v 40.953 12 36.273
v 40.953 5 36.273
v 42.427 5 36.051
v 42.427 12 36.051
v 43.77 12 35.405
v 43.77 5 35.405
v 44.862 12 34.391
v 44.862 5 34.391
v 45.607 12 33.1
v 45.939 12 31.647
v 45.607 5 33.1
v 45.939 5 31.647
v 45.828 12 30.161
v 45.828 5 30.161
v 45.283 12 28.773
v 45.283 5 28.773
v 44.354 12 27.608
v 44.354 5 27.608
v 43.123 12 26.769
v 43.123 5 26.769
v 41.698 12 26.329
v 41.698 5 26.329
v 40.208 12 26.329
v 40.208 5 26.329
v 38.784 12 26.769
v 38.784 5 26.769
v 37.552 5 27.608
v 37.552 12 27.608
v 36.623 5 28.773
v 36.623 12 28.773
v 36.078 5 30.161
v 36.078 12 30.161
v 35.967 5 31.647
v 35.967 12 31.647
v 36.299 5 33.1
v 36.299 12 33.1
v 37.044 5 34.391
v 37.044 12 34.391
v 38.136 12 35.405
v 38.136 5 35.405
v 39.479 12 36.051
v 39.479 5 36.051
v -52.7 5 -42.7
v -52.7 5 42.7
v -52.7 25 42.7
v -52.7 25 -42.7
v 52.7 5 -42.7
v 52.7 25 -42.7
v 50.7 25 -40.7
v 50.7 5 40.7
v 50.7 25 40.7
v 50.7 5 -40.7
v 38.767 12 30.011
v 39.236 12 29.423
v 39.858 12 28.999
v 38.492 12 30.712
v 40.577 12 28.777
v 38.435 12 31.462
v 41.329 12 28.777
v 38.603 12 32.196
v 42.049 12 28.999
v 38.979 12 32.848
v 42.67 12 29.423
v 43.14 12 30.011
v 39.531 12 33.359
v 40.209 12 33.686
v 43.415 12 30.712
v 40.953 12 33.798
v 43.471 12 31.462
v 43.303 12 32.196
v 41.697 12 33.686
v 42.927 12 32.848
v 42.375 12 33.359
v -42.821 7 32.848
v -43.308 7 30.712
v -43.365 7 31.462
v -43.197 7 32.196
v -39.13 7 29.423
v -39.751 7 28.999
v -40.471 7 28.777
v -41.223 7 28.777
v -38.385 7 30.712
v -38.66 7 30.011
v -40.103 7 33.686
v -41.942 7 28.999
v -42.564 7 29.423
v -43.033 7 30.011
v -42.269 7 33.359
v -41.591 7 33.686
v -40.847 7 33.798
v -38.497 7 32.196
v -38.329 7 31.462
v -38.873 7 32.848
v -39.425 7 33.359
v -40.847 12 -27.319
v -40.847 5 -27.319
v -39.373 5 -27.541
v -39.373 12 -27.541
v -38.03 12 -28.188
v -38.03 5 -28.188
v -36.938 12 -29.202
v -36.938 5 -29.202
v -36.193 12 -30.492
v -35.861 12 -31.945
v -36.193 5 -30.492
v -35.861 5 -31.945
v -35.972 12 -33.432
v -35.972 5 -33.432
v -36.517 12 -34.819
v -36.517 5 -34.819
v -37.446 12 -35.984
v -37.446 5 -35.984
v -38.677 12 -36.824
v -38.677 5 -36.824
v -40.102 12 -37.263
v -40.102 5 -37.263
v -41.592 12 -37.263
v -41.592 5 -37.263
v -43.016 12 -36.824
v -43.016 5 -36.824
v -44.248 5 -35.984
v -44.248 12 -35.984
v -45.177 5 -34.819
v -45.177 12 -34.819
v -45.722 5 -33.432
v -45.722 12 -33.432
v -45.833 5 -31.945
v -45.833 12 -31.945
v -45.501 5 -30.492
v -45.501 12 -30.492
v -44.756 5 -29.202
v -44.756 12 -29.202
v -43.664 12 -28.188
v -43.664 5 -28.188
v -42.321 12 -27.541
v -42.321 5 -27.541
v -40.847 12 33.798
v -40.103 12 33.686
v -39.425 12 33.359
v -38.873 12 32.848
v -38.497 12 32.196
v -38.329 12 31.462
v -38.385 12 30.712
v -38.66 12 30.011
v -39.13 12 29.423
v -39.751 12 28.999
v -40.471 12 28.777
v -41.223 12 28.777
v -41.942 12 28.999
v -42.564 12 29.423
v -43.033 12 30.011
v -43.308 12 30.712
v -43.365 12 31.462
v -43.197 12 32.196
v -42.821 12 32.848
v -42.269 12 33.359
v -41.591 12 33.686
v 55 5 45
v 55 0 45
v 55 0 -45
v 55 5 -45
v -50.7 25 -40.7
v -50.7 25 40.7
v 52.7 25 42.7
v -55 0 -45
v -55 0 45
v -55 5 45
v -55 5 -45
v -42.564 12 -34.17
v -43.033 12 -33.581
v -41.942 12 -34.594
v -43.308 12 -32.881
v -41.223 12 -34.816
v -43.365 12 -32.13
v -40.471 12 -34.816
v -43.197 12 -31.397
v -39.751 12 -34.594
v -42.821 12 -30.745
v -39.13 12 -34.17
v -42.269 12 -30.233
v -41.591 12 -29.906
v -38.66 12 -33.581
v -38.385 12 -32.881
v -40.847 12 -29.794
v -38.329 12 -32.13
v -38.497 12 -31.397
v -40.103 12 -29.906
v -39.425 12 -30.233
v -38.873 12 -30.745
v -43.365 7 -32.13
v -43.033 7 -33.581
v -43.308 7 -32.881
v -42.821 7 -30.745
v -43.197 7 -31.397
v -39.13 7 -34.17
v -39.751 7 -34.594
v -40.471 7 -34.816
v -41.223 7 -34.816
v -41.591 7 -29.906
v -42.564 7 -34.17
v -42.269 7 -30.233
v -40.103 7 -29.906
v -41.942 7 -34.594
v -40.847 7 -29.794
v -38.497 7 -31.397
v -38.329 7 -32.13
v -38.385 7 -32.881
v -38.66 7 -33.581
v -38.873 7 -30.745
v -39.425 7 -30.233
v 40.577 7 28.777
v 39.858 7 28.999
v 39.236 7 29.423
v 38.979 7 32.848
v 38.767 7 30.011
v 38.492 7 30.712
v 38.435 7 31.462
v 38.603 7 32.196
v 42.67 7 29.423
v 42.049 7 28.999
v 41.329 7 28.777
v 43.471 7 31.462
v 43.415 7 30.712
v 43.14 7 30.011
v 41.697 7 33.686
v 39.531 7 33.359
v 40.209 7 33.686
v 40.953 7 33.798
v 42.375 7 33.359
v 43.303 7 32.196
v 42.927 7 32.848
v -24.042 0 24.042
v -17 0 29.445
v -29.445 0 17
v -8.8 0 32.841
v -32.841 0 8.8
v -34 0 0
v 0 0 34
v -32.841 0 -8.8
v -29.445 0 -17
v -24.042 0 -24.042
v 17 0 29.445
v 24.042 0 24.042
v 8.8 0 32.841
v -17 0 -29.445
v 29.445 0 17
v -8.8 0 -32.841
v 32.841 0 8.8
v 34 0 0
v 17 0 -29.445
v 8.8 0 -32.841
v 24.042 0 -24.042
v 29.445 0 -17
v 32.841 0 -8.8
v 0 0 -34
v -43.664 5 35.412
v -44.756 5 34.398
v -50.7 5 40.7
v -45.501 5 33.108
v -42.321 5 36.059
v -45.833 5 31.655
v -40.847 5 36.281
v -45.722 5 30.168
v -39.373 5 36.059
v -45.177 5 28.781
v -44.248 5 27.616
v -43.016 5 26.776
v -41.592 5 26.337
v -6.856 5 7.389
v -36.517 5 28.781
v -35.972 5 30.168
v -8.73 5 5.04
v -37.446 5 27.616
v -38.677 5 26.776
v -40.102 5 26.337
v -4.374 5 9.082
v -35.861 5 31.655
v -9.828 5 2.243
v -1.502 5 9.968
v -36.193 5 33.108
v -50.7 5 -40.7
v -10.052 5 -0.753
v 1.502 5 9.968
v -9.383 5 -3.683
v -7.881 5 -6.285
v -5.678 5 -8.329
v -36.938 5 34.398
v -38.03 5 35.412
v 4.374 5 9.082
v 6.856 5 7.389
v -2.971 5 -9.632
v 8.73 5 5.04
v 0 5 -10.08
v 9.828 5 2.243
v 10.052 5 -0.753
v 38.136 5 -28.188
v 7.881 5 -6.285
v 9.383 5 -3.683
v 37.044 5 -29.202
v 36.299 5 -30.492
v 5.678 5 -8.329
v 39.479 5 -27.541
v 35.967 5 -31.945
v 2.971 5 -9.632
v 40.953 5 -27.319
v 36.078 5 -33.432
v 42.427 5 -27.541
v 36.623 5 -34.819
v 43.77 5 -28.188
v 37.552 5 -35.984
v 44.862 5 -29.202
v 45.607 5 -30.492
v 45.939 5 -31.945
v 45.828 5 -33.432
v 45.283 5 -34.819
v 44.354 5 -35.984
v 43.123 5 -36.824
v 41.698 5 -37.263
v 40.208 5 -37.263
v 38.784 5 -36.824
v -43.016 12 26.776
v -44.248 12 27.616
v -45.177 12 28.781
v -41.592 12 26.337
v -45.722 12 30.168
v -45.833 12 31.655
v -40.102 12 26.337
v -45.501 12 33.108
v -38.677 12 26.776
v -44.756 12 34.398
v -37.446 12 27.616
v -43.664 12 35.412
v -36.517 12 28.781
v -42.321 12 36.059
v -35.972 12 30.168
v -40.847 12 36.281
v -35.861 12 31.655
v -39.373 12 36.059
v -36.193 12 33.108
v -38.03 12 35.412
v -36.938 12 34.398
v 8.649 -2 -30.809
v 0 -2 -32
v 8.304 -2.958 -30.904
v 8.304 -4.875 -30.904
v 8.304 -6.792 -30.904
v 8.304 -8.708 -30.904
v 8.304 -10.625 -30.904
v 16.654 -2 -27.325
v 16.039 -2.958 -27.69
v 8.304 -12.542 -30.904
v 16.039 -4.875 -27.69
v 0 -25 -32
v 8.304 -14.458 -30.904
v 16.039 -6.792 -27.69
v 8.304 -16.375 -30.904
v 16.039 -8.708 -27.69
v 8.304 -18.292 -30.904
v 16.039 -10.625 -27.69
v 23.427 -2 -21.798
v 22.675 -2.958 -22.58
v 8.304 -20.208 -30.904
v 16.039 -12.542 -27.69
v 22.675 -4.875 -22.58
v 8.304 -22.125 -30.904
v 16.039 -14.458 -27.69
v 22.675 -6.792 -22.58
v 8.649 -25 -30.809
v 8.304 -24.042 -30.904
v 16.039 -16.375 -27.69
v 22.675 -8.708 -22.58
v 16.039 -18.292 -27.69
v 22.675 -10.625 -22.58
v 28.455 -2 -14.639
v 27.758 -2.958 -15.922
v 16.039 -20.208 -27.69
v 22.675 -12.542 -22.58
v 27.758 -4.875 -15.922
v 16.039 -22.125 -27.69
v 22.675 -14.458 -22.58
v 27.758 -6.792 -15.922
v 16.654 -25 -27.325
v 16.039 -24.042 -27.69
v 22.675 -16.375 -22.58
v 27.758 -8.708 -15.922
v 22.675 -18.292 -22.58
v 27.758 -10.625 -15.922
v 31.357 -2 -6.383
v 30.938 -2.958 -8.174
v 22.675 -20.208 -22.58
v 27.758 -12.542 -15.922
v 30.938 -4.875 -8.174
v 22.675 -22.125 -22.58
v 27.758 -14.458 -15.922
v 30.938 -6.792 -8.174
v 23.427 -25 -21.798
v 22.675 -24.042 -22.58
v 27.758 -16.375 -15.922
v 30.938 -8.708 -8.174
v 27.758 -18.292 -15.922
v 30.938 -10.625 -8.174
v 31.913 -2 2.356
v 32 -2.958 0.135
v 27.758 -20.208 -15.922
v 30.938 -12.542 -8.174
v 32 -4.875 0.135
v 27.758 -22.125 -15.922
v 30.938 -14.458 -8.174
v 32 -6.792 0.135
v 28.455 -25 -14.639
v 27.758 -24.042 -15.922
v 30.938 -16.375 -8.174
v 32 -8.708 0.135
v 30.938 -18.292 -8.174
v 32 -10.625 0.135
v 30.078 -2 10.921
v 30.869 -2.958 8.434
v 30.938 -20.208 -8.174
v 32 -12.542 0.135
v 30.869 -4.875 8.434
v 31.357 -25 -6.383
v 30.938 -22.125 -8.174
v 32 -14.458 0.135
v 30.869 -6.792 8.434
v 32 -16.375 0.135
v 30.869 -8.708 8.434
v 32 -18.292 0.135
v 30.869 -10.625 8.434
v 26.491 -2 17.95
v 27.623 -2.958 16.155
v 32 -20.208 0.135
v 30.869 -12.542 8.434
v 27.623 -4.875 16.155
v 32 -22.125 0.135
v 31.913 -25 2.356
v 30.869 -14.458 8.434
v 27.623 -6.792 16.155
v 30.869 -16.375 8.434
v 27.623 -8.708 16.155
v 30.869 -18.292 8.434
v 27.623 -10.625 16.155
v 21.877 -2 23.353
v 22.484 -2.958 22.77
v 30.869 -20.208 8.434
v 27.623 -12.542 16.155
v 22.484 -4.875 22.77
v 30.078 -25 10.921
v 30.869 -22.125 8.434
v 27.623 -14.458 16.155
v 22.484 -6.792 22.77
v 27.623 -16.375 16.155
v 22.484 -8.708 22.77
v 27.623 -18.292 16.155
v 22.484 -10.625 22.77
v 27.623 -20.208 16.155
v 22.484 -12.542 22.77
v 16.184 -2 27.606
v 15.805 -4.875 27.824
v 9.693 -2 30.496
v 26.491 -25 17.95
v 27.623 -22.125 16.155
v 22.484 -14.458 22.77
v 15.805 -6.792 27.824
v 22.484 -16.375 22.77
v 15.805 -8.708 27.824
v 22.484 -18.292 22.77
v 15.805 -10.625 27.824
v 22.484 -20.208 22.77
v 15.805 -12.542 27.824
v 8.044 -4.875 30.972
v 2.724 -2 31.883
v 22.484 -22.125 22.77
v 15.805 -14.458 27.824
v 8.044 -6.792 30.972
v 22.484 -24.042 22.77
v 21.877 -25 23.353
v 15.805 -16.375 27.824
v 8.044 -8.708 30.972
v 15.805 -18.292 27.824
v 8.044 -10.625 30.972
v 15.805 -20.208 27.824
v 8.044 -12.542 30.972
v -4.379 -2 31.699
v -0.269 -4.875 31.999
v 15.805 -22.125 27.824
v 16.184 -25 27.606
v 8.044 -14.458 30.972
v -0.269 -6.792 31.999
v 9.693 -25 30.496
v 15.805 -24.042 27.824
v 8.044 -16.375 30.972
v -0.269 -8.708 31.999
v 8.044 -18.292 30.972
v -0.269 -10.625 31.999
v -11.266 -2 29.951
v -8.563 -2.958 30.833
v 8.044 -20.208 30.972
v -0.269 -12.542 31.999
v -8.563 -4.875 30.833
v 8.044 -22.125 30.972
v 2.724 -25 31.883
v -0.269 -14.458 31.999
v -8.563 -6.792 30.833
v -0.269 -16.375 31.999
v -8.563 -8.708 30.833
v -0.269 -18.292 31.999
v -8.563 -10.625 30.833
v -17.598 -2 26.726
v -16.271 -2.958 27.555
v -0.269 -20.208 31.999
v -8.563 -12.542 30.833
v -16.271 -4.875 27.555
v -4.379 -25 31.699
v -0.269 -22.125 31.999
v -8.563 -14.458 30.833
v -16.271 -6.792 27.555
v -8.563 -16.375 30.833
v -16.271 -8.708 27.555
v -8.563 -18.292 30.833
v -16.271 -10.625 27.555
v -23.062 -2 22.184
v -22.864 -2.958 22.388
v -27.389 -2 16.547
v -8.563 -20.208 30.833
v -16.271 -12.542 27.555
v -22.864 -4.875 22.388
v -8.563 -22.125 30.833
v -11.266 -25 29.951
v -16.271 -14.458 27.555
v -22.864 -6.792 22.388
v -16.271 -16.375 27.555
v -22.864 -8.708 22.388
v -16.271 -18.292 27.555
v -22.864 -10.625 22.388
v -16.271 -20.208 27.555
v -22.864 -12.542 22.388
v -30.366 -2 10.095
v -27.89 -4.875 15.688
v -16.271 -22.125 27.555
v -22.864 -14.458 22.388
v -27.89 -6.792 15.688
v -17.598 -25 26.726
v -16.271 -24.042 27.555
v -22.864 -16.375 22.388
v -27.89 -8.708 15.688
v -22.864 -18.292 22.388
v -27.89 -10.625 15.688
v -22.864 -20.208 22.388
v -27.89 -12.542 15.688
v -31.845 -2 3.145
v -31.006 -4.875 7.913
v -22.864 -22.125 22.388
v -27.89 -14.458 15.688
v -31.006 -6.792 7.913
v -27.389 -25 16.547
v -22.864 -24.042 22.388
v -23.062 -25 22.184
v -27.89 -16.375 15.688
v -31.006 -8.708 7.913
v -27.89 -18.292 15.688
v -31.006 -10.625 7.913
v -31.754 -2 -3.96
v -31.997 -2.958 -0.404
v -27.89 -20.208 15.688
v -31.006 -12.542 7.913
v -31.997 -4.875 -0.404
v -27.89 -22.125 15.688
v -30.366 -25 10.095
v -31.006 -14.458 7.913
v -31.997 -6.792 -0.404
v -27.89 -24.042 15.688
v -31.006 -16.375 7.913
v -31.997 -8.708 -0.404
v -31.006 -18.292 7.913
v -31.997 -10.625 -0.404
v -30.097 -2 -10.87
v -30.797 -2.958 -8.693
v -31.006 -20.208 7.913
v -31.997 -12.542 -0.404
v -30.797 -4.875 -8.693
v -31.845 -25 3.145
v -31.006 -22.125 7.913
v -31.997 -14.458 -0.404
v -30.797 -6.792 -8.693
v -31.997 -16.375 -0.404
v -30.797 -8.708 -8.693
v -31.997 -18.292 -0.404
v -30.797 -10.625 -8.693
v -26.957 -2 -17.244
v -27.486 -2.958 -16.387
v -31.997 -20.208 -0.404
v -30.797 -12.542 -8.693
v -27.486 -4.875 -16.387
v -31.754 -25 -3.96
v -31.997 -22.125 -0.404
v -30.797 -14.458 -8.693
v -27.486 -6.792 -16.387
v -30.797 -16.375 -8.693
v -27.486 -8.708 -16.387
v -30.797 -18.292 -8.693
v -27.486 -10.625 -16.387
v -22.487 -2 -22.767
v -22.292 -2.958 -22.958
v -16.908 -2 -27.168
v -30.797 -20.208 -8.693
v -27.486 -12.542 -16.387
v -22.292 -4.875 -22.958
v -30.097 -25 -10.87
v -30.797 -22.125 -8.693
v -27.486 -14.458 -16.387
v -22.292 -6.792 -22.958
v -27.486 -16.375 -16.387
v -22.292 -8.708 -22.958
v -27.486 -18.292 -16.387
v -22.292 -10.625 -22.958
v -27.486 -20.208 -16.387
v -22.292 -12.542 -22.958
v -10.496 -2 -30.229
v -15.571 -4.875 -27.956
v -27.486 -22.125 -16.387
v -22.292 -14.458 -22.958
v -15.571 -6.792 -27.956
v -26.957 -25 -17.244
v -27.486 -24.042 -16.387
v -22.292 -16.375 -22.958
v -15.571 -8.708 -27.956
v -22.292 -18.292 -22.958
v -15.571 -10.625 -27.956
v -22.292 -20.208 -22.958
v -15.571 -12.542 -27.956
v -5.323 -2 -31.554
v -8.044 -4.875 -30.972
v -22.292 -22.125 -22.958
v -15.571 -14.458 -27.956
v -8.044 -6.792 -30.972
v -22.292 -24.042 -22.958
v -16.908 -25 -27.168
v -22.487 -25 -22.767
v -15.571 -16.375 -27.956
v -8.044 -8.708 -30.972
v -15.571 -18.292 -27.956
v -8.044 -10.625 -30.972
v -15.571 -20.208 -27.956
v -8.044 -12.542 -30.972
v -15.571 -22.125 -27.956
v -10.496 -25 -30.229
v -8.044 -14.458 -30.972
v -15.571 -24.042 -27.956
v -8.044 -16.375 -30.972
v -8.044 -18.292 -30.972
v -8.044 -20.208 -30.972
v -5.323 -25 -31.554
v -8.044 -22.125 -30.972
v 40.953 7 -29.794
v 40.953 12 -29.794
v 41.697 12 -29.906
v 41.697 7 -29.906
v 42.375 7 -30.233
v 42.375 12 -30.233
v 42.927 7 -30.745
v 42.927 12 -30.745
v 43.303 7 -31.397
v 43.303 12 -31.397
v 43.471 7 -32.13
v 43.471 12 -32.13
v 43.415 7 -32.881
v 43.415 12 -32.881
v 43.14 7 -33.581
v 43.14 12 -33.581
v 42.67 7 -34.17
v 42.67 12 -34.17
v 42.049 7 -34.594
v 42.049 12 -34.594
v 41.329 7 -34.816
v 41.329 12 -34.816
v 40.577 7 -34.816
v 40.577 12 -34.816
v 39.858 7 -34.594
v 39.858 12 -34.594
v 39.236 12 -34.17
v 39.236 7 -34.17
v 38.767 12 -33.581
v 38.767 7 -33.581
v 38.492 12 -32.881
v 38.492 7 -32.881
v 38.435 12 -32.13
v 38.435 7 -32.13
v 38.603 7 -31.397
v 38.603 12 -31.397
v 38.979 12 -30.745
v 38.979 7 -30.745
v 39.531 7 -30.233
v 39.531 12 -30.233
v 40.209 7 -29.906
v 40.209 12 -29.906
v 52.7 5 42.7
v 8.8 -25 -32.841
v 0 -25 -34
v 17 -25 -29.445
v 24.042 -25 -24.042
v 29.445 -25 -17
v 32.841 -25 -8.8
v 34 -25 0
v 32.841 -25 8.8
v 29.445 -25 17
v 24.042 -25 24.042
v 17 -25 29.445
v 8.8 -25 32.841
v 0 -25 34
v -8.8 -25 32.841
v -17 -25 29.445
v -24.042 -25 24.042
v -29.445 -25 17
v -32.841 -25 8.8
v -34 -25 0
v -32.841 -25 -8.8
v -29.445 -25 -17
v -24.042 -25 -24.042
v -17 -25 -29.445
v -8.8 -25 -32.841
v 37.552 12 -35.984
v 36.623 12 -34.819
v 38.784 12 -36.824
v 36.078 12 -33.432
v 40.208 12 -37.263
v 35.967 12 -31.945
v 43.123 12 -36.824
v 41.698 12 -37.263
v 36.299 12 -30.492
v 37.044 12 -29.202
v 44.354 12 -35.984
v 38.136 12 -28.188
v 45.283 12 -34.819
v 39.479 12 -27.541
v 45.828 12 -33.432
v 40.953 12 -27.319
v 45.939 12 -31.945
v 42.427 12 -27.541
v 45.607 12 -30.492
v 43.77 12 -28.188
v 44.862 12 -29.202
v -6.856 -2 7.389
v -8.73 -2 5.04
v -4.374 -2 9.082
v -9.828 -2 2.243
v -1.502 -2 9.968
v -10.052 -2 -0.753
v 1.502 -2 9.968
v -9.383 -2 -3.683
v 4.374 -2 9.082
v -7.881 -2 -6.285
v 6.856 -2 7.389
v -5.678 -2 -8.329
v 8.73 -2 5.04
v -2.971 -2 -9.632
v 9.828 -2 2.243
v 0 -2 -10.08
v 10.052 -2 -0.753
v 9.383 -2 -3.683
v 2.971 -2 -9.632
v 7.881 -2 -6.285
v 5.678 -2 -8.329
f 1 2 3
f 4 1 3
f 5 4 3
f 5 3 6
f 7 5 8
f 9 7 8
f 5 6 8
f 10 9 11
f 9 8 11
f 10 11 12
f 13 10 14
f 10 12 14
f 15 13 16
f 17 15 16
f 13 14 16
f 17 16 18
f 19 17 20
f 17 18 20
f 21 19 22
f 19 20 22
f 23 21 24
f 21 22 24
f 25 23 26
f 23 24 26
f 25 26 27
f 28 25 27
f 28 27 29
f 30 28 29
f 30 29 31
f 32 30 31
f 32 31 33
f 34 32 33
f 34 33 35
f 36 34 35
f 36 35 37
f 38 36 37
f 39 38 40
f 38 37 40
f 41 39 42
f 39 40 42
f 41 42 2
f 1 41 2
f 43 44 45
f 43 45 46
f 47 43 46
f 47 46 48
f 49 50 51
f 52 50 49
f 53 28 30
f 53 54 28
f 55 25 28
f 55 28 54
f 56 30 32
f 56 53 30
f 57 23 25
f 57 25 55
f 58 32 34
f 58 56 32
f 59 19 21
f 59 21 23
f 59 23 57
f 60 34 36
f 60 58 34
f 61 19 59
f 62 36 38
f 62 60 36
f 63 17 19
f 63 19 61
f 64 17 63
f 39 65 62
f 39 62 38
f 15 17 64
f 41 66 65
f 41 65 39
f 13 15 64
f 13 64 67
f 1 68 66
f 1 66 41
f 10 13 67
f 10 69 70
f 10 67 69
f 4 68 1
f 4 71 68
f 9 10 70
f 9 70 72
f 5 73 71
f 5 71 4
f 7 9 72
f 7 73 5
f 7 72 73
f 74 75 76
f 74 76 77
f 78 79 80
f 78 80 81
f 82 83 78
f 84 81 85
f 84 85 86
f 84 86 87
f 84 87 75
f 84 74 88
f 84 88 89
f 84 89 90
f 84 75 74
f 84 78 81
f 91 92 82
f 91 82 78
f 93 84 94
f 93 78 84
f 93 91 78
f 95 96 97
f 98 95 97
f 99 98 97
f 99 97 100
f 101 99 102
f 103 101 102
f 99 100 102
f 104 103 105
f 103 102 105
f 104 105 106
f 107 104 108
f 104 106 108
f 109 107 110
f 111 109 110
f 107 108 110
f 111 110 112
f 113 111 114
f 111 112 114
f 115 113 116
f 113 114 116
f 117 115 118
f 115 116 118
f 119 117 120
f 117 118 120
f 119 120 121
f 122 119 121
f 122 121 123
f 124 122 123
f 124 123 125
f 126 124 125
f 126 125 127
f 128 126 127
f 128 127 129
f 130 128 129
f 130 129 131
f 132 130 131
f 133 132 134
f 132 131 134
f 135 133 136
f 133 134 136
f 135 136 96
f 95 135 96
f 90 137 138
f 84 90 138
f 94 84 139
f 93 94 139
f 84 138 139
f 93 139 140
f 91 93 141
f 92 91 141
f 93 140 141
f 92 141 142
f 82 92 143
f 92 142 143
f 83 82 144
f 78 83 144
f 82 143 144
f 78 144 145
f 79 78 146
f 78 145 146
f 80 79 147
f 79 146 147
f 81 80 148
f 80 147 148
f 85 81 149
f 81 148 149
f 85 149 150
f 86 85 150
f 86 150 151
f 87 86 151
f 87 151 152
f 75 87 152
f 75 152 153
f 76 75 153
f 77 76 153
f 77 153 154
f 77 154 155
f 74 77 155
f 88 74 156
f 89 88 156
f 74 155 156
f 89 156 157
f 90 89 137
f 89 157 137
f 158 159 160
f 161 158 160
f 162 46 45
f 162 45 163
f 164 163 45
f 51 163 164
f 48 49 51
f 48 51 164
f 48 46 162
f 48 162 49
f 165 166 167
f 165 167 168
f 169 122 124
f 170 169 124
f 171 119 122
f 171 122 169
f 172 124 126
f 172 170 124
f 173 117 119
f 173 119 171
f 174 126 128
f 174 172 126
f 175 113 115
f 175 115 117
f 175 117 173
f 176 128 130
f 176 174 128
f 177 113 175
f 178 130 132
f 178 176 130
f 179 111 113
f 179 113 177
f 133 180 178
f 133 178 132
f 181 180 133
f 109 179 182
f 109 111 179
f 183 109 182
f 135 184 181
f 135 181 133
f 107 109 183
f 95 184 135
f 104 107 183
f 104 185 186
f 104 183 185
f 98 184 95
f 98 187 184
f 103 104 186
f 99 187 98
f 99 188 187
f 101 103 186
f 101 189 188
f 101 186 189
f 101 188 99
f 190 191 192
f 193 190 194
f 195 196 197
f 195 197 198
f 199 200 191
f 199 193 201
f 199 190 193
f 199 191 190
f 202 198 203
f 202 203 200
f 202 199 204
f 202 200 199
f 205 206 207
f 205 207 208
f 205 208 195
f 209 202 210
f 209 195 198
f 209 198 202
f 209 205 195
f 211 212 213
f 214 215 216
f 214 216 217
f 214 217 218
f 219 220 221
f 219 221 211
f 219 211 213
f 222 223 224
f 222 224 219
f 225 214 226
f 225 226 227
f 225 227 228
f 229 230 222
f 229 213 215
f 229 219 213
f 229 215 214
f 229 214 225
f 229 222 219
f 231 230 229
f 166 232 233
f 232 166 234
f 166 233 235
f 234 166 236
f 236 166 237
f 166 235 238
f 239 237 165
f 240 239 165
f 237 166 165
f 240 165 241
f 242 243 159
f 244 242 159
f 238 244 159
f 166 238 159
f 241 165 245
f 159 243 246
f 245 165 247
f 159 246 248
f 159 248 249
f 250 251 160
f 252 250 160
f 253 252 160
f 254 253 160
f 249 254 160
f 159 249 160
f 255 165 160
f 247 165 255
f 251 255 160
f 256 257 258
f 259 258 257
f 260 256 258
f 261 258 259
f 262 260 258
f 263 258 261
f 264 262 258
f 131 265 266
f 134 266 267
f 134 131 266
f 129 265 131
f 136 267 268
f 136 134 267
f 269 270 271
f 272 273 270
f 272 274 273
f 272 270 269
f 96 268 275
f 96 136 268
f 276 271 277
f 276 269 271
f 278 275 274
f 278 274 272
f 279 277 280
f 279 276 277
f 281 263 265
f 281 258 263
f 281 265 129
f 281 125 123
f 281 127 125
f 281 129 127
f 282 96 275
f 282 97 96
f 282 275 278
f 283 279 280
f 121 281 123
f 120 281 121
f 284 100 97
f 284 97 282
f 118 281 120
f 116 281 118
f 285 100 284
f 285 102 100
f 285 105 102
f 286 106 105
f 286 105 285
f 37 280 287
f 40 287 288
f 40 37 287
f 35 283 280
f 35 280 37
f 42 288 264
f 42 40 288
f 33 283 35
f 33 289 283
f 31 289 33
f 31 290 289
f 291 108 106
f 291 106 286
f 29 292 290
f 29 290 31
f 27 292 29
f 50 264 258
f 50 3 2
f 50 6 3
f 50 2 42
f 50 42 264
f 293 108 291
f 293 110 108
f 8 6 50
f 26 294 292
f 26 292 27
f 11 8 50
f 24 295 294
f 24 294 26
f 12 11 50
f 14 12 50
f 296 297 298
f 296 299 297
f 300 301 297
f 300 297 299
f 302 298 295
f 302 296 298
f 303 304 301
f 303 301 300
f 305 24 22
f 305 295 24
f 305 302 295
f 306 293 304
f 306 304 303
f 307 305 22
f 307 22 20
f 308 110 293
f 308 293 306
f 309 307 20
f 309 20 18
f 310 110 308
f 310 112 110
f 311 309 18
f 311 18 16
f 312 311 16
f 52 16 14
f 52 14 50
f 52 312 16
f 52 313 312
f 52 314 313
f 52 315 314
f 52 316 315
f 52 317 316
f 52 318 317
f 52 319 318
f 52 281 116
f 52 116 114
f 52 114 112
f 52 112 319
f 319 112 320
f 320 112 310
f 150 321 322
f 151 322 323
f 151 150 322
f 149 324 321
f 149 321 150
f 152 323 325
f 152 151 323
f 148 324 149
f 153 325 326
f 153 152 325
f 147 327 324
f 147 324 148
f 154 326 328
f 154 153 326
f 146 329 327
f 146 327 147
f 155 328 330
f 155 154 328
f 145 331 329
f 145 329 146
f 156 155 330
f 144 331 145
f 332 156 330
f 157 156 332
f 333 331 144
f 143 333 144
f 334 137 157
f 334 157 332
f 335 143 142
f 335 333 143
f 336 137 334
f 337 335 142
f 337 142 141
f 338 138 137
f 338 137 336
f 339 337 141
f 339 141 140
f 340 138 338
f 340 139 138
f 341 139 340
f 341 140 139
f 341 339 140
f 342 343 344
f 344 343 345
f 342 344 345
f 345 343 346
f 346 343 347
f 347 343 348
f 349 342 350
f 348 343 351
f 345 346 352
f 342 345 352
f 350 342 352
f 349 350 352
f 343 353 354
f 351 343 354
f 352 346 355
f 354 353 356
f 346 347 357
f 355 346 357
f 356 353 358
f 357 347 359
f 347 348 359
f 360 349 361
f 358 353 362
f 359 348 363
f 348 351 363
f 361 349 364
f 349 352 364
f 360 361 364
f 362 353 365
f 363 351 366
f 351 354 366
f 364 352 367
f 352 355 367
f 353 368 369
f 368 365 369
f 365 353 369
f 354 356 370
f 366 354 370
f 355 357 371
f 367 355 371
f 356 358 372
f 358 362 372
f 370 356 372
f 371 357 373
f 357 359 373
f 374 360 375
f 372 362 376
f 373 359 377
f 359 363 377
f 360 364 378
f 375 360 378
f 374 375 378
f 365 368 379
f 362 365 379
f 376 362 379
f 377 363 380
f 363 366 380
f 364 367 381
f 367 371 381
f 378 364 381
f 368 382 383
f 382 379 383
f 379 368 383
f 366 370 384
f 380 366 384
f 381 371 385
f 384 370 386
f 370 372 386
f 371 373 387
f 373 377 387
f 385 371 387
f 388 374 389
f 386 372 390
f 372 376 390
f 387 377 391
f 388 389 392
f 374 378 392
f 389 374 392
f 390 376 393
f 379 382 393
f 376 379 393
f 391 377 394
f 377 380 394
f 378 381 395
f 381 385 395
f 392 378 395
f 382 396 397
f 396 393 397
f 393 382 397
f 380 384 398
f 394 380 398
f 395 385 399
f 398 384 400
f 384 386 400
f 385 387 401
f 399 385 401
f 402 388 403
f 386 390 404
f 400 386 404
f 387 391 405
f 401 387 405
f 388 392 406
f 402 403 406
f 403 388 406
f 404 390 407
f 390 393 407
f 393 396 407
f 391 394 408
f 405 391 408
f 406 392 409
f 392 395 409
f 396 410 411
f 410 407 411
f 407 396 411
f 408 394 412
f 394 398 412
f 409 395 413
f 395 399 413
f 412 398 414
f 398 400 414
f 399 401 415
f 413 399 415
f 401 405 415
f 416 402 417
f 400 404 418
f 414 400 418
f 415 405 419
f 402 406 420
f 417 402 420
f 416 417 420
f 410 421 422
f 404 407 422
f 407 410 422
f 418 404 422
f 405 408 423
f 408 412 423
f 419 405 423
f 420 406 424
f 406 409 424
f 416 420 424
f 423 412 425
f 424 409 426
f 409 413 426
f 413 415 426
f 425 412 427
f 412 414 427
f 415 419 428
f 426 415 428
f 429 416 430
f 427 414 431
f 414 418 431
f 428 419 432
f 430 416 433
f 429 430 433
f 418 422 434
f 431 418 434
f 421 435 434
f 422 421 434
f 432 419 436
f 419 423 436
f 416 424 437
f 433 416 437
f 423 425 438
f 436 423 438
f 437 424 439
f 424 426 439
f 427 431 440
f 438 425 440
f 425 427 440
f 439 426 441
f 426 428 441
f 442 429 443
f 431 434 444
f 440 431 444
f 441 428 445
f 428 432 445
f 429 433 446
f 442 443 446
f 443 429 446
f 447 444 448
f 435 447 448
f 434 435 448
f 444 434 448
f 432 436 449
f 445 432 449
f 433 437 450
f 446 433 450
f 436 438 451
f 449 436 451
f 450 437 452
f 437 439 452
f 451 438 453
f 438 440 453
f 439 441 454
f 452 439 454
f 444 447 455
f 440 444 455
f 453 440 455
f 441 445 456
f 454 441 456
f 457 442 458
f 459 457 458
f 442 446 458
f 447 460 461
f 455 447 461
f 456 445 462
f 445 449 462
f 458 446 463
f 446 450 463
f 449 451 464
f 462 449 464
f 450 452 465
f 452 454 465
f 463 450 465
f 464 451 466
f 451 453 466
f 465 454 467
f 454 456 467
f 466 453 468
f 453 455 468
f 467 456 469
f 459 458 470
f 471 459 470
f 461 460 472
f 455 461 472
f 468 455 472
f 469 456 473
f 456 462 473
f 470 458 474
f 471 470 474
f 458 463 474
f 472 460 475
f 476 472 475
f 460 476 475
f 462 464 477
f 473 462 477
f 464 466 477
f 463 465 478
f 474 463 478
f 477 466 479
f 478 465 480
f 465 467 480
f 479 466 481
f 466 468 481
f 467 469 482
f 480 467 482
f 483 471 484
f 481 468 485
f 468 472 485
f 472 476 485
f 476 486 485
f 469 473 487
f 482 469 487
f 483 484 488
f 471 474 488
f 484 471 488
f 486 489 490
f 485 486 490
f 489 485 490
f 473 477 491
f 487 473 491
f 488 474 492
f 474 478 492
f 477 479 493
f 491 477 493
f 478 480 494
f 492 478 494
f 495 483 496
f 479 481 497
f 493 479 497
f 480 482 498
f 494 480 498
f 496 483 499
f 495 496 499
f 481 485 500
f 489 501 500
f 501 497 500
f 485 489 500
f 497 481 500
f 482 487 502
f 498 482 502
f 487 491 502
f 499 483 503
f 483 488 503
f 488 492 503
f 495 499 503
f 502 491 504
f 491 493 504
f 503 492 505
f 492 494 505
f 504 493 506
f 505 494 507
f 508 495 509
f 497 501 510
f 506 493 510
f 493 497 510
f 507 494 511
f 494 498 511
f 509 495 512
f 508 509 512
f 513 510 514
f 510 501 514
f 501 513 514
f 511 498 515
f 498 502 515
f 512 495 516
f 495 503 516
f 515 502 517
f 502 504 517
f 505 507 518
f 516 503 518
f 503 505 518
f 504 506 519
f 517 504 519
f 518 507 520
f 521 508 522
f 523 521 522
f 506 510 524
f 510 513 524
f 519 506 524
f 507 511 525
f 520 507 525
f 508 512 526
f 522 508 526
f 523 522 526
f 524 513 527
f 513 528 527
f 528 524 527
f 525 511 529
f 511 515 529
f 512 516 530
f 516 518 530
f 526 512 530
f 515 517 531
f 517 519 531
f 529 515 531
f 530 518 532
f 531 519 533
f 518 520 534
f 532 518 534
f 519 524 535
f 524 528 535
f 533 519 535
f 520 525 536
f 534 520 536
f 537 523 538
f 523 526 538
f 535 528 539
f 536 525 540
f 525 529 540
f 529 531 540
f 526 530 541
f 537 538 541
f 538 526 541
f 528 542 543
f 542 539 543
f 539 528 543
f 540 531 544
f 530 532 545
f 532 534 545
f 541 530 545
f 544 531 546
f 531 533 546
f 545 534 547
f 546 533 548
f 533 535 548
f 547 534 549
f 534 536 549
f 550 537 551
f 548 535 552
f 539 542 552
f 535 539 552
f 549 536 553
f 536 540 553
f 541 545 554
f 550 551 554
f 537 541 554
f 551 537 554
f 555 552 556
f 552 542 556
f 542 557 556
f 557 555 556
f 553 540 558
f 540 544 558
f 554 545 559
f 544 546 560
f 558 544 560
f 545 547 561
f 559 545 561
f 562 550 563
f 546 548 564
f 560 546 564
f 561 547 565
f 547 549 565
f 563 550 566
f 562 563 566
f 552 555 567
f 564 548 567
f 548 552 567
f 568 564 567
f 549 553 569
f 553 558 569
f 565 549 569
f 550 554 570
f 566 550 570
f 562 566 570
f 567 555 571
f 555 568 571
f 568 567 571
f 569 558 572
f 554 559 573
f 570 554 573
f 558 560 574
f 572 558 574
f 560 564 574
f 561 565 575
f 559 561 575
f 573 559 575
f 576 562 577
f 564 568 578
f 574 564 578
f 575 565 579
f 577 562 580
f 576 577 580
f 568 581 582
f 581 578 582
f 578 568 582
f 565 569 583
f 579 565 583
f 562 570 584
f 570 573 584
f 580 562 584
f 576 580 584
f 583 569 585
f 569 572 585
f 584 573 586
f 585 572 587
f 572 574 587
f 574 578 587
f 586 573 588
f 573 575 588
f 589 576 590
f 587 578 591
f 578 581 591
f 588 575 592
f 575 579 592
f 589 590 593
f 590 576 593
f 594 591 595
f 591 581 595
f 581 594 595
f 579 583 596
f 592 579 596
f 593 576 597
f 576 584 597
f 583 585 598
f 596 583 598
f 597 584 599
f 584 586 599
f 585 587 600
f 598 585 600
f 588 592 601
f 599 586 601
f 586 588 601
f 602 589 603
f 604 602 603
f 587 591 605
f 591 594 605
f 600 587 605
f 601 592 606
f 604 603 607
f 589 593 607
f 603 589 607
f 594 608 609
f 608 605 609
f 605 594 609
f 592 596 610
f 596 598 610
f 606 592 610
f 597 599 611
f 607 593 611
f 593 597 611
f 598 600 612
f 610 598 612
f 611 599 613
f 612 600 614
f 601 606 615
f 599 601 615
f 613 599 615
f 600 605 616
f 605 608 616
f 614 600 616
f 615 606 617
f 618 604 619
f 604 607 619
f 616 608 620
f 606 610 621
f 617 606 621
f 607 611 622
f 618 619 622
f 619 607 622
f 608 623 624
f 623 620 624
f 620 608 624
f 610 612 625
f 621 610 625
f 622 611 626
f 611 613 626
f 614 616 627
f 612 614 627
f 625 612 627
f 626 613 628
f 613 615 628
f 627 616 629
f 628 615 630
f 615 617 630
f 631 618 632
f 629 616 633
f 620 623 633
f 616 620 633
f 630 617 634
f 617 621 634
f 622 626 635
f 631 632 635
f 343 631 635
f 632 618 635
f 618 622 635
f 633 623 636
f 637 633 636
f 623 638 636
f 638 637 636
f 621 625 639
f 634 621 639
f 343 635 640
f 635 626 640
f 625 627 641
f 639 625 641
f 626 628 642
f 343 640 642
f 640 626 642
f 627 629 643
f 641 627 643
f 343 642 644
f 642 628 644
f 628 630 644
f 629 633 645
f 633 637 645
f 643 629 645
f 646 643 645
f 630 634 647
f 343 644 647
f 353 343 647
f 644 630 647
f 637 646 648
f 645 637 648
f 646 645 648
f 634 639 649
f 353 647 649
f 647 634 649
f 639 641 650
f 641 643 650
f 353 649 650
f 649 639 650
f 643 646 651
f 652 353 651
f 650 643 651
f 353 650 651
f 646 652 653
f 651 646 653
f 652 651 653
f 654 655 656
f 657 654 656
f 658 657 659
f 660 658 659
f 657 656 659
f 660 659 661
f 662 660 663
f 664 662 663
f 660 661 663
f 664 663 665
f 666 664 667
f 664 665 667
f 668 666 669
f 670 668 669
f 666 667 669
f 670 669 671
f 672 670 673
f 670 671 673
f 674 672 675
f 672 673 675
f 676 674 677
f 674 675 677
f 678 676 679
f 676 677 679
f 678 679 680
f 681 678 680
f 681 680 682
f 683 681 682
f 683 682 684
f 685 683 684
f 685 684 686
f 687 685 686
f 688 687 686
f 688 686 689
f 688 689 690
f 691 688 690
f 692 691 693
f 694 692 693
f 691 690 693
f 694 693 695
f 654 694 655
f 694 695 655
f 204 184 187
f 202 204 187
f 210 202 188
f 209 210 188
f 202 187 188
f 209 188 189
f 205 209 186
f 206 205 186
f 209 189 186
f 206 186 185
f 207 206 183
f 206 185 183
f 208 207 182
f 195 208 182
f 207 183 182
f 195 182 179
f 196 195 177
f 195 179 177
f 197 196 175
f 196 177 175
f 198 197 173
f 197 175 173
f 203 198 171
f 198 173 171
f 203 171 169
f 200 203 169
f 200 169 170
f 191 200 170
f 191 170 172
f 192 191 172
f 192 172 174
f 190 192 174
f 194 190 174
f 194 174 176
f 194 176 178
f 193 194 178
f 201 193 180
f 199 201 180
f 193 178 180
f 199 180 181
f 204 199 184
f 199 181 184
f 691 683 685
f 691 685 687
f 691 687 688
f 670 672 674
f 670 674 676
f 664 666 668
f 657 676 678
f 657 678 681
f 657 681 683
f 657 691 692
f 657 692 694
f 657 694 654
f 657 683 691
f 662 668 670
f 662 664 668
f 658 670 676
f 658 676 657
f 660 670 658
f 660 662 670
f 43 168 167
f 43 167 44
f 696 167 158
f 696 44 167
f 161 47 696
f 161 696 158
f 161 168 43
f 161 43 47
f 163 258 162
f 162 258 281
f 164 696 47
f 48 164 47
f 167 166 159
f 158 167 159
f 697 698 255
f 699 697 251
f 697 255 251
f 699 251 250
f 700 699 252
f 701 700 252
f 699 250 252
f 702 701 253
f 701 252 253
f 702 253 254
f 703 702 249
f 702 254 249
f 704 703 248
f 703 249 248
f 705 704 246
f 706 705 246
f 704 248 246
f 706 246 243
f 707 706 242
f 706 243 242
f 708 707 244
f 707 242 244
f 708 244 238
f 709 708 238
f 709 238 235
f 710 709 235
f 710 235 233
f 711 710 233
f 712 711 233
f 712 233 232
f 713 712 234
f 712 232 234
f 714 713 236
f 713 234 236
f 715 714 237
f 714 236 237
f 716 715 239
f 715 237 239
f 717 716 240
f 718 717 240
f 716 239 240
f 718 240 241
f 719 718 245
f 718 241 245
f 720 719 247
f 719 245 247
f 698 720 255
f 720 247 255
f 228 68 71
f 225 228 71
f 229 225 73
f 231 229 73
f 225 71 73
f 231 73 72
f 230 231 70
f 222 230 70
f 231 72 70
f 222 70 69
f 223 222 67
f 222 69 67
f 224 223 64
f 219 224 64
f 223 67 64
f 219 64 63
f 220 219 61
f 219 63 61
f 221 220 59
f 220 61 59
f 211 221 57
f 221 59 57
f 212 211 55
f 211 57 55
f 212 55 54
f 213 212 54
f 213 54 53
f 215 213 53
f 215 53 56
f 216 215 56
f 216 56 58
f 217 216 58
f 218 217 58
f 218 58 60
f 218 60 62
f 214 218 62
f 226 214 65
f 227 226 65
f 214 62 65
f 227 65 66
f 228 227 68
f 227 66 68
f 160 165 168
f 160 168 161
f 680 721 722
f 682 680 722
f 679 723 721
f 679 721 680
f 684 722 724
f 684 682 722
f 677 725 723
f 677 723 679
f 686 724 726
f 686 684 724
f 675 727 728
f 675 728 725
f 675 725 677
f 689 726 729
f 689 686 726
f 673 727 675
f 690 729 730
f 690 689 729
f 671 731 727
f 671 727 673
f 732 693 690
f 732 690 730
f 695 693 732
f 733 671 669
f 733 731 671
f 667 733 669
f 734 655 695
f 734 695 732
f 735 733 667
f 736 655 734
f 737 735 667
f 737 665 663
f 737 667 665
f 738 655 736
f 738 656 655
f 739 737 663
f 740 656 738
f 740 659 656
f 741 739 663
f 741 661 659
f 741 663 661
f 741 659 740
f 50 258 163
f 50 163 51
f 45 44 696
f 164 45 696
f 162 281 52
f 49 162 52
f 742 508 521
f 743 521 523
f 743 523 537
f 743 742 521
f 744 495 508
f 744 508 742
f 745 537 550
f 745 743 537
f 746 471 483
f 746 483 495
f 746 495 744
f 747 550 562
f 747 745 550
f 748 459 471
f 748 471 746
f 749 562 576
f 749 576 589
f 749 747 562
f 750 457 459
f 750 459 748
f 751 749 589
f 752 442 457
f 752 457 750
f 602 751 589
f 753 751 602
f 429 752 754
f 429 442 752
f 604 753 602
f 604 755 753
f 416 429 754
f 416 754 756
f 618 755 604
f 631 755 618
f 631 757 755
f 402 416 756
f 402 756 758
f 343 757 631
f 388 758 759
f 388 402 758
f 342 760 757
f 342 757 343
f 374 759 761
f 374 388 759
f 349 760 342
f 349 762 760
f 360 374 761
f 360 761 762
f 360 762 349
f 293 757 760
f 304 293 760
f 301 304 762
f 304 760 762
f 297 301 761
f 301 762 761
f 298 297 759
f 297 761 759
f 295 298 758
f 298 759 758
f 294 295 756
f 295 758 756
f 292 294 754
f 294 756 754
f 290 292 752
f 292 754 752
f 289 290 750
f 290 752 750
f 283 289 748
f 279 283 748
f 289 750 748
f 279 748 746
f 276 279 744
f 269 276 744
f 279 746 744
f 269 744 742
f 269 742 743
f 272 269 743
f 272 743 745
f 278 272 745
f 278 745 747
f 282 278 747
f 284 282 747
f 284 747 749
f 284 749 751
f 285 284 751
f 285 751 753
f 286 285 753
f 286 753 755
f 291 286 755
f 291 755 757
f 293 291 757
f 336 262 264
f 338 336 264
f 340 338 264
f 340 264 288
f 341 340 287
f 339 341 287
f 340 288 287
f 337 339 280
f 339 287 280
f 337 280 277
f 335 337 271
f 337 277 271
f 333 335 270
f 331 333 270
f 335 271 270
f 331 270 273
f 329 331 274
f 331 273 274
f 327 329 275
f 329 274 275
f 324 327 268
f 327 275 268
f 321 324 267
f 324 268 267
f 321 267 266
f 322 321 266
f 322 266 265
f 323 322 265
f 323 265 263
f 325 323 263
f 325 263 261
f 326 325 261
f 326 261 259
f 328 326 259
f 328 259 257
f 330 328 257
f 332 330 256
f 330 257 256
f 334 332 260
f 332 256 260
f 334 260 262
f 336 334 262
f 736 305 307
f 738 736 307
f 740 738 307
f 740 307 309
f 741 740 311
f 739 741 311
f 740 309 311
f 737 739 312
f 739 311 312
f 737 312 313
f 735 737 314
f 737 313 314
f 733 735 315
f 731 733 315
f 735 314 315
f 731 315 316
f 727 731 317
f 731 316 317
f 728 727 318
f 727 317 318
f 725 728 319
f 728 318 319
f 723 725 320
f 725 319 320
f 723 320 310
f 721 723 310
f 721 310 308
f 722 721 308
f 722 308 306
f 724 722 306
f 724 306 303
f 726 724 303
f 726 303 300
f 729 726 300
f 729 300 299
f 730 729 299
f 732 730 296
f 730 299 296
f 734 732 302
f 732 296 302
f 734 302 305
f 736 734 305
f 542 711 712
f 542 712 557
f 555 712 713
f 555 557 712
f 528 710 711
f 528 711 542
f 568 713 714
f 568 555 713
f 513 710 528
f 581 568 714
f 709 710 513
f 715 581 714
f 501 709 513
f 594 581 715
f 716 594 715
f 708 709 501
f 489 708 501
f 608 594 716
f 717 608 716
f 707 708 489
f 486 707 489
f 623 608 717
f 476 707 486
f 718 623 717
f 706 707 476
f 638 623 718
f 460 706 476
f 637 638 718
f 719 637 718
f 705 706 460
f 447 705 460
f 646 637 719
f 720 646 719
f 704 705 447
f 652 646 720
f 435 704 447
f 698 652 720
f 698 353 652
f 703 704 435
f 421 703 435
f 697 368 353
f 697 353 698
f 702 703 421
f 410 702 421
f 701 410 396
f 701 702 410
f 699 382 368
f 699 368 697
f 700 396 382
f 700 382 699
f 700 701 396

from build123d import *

# Parameters (mm, degrees)
SKETCH1_W           = 110
SKETCH1_H           = 90
BOSS_EXTRUDE1_DEPTH = 5
SKETCH4_W           = 105.4
SKETCH4_H           = 85.4
SKETCH4_W_2         = 101.4
SKETCH4_H_2         = 81.4
BOSS_EXTRUDE2_DEPTH = 20
SKETCH5_R           = 5
BOSS_EXTRUDE3_DEPTH = 7
SKETCH9_R           = 2.524761235
CUT_EXTRUDE1_DEPTH  = 5
SKETCH10_R          = 34
BOSS_EXTRUDE4_DEPTH = 25
SKETCH11_R          = 10.080259213
CUT_EXTRUDE2_DEPTH  = 31
CUT_EXTRUDE3_DEPTH  = 23


with BuildPart() as part:
    # Sketch1 → Boss-Extrude1 (new body)
    with BuildSketch(Plane(origin=(0, 0, 0), x_dir=(1, 0, 0), z_dir=(0, 1, 0))):
        Rectangle(SKETCH1_W, SKETCH1_H)
    extrude(amount=BOSS_EXTRUDE1_DEPTH)

    # Sketch4 → Boss-Extrude2 (add)
    with BuildSketch(Plane(origin=(0, 5, 0), x_dir=(1, 0, 0), z_dir=(0, 1, 0))):
        Rectangle(SKETCH4_W, SKETCH4_H)
        Rectangle(SKETCH4_W_2, SKETCH4_H_2, mode=Mode.SUBTRACT)
    extrude(amount=BOSS_EXTRUDE2_DEPTH)

    # Sketch5 → Boss-Extrude3 (add)
    with BuildSketch(Plane(origin=(0, 5, 0), x_dir=(1, 0, 0), z_dir=(0, 1, 0))):
        with Locations(Location((-40.846907762, 32.318983418, 0), (0, 0, 270))):
            Circle(SKETCH5_R)
        with Locations(Location((-40.846907762, -31.281016582, 0), (0, 0, 270))):
            Circle(SKETCH5_R)
        with Locations(Location((40.953092238, -31.273370815, 0), (0, 0, 270))):
            Circle(SKETCH5_R)
        with Locations(Location((40.953092238, 32.318983418, 0), (0, 0, 270))):
            Circle(SKETCH5_R)
    extrude(amount=BOSS_EXTRUDE3_DEPTH)

    # Sketch9 → Cut-Extrude1 (cut)
    with BuildSketch(Plane(origin=(0, 12, 0), x_dir=(1, 0, 0), z_dir=(0, 1, 0))):
        with Locations(Location((40.953092238, 32.318983418, 0), (0, 0, 270))):
            Circle(SKETCH9_R)
        with Locations(Location((40.953092238, -31.273370815, 0), (0, 0, 270))):
            Circle(SKETCH9_R)
        with Locations(Location((-40.846907762, -31.273370815, 0), (0, 0, 270))):
            Circle(SKETCH9_R)
        with Locations(Location((-40.846907762, 32.318983418, 0), (0, 0, 270))):
            Circle(SKETCH9_R)
    extrude(amount=-CUT_EXTRUDE1_DEPTH, mode=Mode.SUBTRACT)

    # Sketch10 → Boss-Extrude4 (add)
    with BuildSketch(Plane.XZ):
        with Locations(Location((0, 0, 0), (0, 0, 270))):
            Circle(SKETCH10_R)
    extrude(amount=BOSS_EXTRUDE4_DEPTH)

    # Sketch11 → Cut-Extrude2 (cut)
    with BuildSketch(Plane(origin=(0, -25, 0), x_dir=(-1, 0, 0), z_dir=(0, -1, 0))):
        with Locations(Location((0, 0, 0), (0, 0, 90))):
            Circle(SKETCH11_R)
    extrude(amount=-CUT_EXTRUDE2_DEPTH, mode=Mode.SUBTRACT)

    # 3DSketch1 → Cut-Extrude3 (cut)
    with BuildSketch(Plane(origin=(0, -25, -32), x_dir=(-0.004227803372085143, 0, 0.9999910627993868), z_dir=(0, 1, 0))):
        with BuildLine():
            add(Edge.make_bspline(
                [(0, 0), (-0.011789907, 2.799656794), (0.703810307, 8.402918744), (3.921124481, 16.240807355), (9.062436479, 22.975250557), (15.774929183, 28.145163081), (23.599222448, 31.395708592), (31.998932575, 32.504978995), (40.398695895, 31.396113621), (48.223147077, 28.145948653), (54.935885594, 22.976350086), (60.077545593, 16.242187891), (63.295168912, 8.404298627), (64.369120742, 0), (63.224955208, -8.395027888), (59.941927667, -16.205747313), (54.744156701, -22.896695338), (47.988440156, -28.01000158), (40.137094558, -31.194649365), (31.728354863, -32.233260194), (23.338213795, -31.053824953), (15.541353588, -27.737955266), (8.872355042, -22.512245002), (3.841180978, -15.806348738), (0.727018017, -8.127446073), (0.01141332, -2.710231546), (0, 0)],
                knots=[0, 0, 0, 0, 0.041777734, 0.083555145, 0.125332704, 0.167110267, 0.208887828, 0.25066539, 0.292442951, 0.334220512, 0.375998074, 0.417775635, 0.459553197, 0.501330758, 0.543108319, 0.584885881, 0.626663442, 0.668441003, 0.710218565, 0.751996126, 0.793773688, 0.835551249, 0.877328803, 0.919106374, 0.95955671, 1, 1, 1, 1], degree=3))
        make_face()
    extrude(amount=CUT_EXTRUDE3_DEPTH, mode=Mode.SUBTRACT)


solid = part.part
